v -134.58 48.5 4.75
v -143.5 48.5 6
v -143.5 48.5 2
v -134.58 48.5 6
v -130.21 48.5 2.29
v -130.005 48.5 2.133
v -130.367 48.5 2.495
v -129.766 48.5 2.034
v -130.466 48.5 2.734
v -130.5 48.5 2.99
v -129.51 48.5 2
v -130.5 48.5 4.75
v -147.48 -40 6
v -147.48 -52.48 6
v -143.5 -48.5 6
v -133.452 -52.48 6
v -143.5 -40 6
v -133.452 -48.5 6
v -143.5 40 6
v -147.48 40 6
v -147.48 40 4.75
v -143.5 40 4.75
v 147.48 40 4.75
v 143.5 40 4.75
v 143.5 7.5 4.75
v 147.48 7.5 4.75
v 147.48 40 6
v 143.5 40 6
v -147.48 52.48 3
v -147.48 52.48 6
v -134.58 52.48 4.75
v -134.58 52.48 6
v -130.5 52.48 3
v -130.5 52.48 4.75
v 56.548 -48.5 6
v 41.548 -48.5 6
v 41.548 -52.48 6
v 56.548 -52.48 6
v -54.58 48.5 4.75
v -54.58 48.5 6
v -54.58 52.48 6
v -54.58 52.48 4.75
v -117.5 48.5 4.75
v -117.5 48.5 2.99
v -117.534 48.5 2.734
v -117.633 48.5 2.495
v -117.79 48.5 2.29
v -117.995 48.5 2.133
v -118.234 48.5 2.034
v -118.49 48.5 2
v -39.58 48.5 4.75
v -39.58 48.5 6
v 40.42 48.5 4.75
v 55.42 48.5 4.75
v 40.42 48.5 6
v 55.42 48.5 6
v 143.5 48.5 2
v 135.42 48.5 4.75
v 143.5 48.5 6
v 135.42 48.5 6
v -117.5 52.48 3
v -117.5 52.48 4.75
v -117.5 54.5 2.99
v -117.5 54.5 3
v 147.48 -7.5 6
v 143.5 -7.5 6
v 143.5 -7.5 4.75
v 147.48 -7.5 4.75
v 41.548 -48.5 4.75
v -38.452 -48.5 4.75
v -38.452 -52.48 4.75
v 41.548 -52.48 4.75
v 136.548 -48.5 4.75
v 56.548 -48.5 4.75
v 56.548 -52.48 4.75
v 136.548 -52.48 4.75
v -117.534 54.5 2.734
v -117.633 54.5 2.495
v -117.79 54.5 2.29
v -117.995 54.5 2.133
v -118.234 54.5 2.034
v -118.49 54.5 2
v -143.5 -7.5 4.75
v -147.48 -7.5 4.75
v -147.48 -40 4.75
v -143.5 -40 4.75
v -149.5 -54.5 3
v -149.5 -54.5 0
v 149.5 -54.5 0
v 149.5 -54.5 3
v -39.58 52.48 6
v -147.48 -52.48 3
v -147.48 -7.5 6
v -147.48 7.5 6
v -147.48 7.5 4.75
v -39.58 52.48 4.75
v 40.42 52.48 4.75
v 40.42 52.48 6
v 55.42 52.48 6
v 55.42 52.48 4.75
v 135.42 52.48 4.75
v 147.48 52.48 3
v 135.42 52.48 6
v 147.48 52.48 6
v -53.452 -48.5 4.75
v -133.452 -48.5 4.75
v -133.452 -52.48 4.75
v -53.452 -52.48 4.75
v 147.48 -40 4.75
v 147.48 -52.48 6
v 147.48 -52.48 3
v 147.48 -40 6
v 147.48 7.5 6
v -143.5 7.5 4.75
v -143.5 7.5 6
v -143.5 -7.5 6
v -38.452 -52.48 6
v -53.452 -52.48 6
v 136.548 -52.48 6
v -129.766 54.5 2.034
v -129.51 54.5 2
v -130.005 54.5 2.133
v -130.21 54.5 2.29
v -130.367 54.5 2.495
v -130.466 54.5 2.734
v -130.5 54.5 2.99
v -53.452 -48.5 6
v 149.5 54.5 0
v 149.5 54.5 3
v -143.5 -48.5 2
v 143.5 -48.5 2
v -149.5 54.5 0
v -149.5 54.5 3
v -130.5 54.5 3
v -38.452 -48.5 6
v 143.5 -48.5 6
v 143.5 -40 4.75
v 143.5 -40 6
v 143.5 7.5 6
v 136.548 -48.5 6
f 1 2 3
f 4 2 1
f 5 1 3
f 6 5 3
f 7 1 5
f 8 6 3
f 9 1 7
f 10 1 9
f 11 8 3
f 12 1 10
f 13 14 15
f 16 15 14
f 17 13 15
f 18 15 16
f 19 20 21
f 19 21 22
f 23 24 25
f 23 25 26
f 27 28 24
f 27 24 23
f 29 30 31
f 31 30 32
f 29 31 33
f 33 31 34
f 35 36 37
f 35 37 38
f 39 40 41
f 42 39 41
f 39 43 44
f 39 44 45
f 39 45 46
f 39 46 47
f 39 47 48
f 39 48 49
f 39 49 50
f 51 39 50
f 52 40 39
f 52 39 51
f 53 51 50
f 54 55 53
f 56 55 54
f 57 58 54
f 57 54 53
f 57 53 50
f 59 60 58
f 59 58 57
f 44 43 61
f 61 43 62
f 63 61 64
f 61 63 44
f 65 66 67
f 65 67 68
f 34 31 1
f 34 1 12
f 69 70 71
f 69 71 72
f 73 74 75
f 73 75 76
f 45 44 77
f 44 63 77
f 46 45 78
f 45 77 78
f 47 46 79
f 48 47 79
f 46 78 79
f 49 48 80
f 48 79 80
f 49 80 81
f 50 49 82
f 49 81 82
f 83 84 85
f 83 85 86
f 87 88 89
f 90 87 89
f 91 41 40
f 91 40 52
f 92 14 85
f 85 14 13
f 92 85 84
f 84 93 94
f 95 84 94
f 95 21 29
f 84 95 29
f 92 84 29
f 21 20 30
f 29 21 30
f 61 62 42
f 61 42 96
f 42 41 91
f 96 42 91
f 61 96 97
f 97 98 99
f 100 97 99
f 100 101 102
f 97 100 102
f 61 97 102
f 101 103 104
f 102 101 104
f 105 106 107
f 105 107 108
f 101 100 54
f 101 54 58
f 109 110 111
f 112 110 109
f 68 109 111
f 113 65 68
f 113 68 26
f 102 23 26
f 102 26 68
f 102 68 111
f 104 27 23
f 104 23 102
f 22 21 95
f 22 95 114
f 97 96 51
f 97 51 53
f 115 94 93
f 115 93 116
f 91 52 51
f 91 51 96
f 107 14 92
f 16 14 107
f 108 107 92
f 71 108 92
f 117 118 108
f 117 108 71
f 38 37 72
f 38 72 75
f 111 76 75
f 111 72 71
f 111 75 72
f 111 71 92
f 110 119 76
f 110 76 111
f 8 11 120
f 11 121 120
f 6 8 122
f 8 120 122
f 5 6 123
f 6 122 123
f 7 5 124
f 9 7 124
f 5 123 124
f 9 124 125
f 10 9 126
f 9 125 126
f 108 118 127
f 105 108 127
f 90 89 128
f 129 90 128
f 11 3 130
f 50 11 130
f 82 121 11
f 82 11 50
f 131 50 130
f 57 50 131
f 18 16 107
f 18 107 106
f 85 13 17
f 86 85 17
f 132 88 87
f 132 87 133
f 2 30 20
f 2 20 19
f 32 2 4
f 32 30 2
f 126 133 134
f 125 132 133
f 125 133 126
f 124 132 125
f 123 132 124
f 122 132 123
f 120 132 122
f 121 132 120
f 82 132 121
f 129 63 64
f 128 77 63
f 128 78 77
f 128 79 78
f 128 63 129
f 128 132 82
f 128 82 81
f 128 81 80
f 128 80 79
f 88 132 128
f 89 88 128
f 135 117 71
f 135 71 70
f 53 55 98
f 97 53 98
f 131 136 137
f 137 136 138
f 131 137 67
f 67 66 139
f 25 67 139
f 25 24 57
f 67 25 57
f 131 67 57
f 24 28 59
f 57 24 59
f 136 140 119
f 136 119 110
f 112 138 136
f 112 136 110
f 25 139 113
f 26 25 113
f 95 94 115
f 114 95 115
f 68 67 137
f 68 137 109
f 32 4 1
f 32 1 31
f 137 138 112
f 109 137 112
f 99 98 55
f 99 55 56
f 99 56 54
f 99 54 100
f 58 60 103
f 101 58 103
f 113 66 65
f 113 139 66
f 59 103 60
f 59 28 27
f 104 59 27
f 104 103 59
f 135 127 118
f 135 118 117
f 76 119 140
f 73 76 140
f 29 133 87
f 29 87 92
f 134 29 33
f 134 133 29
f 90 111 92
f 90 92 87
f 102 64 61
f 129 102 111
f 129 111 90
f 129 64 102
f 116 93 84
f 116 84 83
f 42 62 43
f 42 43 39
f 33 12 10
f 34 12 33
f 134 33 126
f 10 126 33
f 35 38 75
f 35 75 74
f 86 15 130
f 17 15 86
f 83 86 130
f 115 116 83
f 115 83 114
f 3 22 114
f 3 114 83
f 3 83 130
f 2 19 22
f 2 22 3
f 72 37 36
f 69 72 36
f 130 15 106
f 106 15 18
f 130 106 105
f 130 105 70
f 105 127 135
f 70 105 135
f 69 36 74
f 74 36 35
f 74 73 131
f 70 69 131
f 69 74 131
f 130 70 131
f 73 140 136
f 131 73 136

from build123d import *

# Parameters (mm, degrees)
SKETCH001_W     = 299
SKETCH001_H     = 109
PAD_DEPTH       = 6
SKETCH002_W     = 287
SKETCH002_H     = 97
POCKET_DEPTH    = 4
SKETCH003_W     = 299
SKETCH003_H     = 109
SKETCH003_W_2   = 294.96
SKETCH003_H_2   = 104.96
POCKET001_DEPTH = 3
SKETCH004_W     = 80
SKETCH004_H     = 4
SKETCH004_W_2   = 4
SKETCH004_H_2   = 32.5
POCKET002_DEPTH = 1.25
SKETCH_W        = 13
SKETCH_H        = 6
POCKET003_DEPTH = 4
FILLET_R        = 0.99
FILLET001_R     = 0.99


with BuildPart() as part:
    # Sketch001 → Pad (new body)
    with BuildSketch(Plane.XY):
        Rectangle(SKETCH001_W, SKETCH001_H)
    extrude(amount=PAD_DEPTH)

    # Sketch002 (on Face6 of Pad) → Pocket (cut)
    with BuildSketch(Plane.XY.offset(6)):
        Rectangle(SKETCH002_W, SKETCH002_H)
    extrude(amount=-POCKET_DEPTH, mode=Mode.SUBTRACT)

    # Sketch003 (on Face5 of Pocket) → Pocket001 (cut)
    with BuildSketch(Plane.XY.offset(6)):
        Rectangle(SKETCH003_W, SKETCH003_H)
        Rectangle(SKETCH003_W_2, SKETCH003_H_2, mode=Mode.SUBTRACT)
    extrude(amount=-POCKET001_DEPTH, mode=Mode.SUBTRACT)

    # Sketch004 (on Face11 of Pocket001) → Pocket002 (cut)
    with BuildSketch(Plane.XY.offset(6)):
        with Locations((-94.580218, 50.5)):
            Rectangle(SKETCH004_W, SKETCH004_H)
        with Locations((0.419782, 50.5)):
            Rectangle(SKETCH004_W, SKETCH004_H)
        with Locations((95.419782, 50.5)):
            Rectangle(SKETCH004_W, SKETCH004_H)
        with Locations((96.548097, -50.5)):
            Rectangle(SKETCH004_W, SKETCH004_H)
        with Locations((1.548097, -50.5)):
            Rectangle(SKETCH004_W, SKETCH004_H)
        with Locations((-93.451903, -50.5)):
            Rectangle(SKETCH004_W, SKETCH004_H)
        with Locations((-145.5, 23.75)):
            Rectangle(SKETCH004_W_2, SKETCH004_H_2)
        with Locations((-145.5, -23.75)):
            Rectangle(SKETCH004_W_2, SKETCH004_H_2)
        with Locations((145.5, 23.75)):
            Rectangle(SKETCH004_W_2, SKETCH004_H_2)
        with Locations((145.5, -23.75)):
            Rectangle(SKETCH004_W_2, SKETCH004_H_2)
    extrude(amount=-POCKET002_DEPTH, mode=Mode.SUBTRACT)

    # Sketch (on Face43 of Pocket002) → Pocket003 (cut)
    with BuildSketch(Plane.XY.offset(6)):
        with Locations((-124, 51.5)):
            Rectangle(SKETCH_W, SKETCH_H)
    extrude(amount=-POCKET003_DEPTH, mode=Mode.SUBTRACT)

    # Fillet
    fillet_edges = [part.edges().sort_by_distance(p)[0] for p in [
        (-130.5, 51.5, 2),
    ]]
    fillet(fillet_edges, radius=FILLET_R)

    # Fillet001
    fillet001_edges = [part.edges().sort_by_distance(p)[0] for p in [
        (-117.5, 51.5, 2),
    ]]
    fillet(fillet001_edges, radius=FILLET001_R)


solid = part.part
